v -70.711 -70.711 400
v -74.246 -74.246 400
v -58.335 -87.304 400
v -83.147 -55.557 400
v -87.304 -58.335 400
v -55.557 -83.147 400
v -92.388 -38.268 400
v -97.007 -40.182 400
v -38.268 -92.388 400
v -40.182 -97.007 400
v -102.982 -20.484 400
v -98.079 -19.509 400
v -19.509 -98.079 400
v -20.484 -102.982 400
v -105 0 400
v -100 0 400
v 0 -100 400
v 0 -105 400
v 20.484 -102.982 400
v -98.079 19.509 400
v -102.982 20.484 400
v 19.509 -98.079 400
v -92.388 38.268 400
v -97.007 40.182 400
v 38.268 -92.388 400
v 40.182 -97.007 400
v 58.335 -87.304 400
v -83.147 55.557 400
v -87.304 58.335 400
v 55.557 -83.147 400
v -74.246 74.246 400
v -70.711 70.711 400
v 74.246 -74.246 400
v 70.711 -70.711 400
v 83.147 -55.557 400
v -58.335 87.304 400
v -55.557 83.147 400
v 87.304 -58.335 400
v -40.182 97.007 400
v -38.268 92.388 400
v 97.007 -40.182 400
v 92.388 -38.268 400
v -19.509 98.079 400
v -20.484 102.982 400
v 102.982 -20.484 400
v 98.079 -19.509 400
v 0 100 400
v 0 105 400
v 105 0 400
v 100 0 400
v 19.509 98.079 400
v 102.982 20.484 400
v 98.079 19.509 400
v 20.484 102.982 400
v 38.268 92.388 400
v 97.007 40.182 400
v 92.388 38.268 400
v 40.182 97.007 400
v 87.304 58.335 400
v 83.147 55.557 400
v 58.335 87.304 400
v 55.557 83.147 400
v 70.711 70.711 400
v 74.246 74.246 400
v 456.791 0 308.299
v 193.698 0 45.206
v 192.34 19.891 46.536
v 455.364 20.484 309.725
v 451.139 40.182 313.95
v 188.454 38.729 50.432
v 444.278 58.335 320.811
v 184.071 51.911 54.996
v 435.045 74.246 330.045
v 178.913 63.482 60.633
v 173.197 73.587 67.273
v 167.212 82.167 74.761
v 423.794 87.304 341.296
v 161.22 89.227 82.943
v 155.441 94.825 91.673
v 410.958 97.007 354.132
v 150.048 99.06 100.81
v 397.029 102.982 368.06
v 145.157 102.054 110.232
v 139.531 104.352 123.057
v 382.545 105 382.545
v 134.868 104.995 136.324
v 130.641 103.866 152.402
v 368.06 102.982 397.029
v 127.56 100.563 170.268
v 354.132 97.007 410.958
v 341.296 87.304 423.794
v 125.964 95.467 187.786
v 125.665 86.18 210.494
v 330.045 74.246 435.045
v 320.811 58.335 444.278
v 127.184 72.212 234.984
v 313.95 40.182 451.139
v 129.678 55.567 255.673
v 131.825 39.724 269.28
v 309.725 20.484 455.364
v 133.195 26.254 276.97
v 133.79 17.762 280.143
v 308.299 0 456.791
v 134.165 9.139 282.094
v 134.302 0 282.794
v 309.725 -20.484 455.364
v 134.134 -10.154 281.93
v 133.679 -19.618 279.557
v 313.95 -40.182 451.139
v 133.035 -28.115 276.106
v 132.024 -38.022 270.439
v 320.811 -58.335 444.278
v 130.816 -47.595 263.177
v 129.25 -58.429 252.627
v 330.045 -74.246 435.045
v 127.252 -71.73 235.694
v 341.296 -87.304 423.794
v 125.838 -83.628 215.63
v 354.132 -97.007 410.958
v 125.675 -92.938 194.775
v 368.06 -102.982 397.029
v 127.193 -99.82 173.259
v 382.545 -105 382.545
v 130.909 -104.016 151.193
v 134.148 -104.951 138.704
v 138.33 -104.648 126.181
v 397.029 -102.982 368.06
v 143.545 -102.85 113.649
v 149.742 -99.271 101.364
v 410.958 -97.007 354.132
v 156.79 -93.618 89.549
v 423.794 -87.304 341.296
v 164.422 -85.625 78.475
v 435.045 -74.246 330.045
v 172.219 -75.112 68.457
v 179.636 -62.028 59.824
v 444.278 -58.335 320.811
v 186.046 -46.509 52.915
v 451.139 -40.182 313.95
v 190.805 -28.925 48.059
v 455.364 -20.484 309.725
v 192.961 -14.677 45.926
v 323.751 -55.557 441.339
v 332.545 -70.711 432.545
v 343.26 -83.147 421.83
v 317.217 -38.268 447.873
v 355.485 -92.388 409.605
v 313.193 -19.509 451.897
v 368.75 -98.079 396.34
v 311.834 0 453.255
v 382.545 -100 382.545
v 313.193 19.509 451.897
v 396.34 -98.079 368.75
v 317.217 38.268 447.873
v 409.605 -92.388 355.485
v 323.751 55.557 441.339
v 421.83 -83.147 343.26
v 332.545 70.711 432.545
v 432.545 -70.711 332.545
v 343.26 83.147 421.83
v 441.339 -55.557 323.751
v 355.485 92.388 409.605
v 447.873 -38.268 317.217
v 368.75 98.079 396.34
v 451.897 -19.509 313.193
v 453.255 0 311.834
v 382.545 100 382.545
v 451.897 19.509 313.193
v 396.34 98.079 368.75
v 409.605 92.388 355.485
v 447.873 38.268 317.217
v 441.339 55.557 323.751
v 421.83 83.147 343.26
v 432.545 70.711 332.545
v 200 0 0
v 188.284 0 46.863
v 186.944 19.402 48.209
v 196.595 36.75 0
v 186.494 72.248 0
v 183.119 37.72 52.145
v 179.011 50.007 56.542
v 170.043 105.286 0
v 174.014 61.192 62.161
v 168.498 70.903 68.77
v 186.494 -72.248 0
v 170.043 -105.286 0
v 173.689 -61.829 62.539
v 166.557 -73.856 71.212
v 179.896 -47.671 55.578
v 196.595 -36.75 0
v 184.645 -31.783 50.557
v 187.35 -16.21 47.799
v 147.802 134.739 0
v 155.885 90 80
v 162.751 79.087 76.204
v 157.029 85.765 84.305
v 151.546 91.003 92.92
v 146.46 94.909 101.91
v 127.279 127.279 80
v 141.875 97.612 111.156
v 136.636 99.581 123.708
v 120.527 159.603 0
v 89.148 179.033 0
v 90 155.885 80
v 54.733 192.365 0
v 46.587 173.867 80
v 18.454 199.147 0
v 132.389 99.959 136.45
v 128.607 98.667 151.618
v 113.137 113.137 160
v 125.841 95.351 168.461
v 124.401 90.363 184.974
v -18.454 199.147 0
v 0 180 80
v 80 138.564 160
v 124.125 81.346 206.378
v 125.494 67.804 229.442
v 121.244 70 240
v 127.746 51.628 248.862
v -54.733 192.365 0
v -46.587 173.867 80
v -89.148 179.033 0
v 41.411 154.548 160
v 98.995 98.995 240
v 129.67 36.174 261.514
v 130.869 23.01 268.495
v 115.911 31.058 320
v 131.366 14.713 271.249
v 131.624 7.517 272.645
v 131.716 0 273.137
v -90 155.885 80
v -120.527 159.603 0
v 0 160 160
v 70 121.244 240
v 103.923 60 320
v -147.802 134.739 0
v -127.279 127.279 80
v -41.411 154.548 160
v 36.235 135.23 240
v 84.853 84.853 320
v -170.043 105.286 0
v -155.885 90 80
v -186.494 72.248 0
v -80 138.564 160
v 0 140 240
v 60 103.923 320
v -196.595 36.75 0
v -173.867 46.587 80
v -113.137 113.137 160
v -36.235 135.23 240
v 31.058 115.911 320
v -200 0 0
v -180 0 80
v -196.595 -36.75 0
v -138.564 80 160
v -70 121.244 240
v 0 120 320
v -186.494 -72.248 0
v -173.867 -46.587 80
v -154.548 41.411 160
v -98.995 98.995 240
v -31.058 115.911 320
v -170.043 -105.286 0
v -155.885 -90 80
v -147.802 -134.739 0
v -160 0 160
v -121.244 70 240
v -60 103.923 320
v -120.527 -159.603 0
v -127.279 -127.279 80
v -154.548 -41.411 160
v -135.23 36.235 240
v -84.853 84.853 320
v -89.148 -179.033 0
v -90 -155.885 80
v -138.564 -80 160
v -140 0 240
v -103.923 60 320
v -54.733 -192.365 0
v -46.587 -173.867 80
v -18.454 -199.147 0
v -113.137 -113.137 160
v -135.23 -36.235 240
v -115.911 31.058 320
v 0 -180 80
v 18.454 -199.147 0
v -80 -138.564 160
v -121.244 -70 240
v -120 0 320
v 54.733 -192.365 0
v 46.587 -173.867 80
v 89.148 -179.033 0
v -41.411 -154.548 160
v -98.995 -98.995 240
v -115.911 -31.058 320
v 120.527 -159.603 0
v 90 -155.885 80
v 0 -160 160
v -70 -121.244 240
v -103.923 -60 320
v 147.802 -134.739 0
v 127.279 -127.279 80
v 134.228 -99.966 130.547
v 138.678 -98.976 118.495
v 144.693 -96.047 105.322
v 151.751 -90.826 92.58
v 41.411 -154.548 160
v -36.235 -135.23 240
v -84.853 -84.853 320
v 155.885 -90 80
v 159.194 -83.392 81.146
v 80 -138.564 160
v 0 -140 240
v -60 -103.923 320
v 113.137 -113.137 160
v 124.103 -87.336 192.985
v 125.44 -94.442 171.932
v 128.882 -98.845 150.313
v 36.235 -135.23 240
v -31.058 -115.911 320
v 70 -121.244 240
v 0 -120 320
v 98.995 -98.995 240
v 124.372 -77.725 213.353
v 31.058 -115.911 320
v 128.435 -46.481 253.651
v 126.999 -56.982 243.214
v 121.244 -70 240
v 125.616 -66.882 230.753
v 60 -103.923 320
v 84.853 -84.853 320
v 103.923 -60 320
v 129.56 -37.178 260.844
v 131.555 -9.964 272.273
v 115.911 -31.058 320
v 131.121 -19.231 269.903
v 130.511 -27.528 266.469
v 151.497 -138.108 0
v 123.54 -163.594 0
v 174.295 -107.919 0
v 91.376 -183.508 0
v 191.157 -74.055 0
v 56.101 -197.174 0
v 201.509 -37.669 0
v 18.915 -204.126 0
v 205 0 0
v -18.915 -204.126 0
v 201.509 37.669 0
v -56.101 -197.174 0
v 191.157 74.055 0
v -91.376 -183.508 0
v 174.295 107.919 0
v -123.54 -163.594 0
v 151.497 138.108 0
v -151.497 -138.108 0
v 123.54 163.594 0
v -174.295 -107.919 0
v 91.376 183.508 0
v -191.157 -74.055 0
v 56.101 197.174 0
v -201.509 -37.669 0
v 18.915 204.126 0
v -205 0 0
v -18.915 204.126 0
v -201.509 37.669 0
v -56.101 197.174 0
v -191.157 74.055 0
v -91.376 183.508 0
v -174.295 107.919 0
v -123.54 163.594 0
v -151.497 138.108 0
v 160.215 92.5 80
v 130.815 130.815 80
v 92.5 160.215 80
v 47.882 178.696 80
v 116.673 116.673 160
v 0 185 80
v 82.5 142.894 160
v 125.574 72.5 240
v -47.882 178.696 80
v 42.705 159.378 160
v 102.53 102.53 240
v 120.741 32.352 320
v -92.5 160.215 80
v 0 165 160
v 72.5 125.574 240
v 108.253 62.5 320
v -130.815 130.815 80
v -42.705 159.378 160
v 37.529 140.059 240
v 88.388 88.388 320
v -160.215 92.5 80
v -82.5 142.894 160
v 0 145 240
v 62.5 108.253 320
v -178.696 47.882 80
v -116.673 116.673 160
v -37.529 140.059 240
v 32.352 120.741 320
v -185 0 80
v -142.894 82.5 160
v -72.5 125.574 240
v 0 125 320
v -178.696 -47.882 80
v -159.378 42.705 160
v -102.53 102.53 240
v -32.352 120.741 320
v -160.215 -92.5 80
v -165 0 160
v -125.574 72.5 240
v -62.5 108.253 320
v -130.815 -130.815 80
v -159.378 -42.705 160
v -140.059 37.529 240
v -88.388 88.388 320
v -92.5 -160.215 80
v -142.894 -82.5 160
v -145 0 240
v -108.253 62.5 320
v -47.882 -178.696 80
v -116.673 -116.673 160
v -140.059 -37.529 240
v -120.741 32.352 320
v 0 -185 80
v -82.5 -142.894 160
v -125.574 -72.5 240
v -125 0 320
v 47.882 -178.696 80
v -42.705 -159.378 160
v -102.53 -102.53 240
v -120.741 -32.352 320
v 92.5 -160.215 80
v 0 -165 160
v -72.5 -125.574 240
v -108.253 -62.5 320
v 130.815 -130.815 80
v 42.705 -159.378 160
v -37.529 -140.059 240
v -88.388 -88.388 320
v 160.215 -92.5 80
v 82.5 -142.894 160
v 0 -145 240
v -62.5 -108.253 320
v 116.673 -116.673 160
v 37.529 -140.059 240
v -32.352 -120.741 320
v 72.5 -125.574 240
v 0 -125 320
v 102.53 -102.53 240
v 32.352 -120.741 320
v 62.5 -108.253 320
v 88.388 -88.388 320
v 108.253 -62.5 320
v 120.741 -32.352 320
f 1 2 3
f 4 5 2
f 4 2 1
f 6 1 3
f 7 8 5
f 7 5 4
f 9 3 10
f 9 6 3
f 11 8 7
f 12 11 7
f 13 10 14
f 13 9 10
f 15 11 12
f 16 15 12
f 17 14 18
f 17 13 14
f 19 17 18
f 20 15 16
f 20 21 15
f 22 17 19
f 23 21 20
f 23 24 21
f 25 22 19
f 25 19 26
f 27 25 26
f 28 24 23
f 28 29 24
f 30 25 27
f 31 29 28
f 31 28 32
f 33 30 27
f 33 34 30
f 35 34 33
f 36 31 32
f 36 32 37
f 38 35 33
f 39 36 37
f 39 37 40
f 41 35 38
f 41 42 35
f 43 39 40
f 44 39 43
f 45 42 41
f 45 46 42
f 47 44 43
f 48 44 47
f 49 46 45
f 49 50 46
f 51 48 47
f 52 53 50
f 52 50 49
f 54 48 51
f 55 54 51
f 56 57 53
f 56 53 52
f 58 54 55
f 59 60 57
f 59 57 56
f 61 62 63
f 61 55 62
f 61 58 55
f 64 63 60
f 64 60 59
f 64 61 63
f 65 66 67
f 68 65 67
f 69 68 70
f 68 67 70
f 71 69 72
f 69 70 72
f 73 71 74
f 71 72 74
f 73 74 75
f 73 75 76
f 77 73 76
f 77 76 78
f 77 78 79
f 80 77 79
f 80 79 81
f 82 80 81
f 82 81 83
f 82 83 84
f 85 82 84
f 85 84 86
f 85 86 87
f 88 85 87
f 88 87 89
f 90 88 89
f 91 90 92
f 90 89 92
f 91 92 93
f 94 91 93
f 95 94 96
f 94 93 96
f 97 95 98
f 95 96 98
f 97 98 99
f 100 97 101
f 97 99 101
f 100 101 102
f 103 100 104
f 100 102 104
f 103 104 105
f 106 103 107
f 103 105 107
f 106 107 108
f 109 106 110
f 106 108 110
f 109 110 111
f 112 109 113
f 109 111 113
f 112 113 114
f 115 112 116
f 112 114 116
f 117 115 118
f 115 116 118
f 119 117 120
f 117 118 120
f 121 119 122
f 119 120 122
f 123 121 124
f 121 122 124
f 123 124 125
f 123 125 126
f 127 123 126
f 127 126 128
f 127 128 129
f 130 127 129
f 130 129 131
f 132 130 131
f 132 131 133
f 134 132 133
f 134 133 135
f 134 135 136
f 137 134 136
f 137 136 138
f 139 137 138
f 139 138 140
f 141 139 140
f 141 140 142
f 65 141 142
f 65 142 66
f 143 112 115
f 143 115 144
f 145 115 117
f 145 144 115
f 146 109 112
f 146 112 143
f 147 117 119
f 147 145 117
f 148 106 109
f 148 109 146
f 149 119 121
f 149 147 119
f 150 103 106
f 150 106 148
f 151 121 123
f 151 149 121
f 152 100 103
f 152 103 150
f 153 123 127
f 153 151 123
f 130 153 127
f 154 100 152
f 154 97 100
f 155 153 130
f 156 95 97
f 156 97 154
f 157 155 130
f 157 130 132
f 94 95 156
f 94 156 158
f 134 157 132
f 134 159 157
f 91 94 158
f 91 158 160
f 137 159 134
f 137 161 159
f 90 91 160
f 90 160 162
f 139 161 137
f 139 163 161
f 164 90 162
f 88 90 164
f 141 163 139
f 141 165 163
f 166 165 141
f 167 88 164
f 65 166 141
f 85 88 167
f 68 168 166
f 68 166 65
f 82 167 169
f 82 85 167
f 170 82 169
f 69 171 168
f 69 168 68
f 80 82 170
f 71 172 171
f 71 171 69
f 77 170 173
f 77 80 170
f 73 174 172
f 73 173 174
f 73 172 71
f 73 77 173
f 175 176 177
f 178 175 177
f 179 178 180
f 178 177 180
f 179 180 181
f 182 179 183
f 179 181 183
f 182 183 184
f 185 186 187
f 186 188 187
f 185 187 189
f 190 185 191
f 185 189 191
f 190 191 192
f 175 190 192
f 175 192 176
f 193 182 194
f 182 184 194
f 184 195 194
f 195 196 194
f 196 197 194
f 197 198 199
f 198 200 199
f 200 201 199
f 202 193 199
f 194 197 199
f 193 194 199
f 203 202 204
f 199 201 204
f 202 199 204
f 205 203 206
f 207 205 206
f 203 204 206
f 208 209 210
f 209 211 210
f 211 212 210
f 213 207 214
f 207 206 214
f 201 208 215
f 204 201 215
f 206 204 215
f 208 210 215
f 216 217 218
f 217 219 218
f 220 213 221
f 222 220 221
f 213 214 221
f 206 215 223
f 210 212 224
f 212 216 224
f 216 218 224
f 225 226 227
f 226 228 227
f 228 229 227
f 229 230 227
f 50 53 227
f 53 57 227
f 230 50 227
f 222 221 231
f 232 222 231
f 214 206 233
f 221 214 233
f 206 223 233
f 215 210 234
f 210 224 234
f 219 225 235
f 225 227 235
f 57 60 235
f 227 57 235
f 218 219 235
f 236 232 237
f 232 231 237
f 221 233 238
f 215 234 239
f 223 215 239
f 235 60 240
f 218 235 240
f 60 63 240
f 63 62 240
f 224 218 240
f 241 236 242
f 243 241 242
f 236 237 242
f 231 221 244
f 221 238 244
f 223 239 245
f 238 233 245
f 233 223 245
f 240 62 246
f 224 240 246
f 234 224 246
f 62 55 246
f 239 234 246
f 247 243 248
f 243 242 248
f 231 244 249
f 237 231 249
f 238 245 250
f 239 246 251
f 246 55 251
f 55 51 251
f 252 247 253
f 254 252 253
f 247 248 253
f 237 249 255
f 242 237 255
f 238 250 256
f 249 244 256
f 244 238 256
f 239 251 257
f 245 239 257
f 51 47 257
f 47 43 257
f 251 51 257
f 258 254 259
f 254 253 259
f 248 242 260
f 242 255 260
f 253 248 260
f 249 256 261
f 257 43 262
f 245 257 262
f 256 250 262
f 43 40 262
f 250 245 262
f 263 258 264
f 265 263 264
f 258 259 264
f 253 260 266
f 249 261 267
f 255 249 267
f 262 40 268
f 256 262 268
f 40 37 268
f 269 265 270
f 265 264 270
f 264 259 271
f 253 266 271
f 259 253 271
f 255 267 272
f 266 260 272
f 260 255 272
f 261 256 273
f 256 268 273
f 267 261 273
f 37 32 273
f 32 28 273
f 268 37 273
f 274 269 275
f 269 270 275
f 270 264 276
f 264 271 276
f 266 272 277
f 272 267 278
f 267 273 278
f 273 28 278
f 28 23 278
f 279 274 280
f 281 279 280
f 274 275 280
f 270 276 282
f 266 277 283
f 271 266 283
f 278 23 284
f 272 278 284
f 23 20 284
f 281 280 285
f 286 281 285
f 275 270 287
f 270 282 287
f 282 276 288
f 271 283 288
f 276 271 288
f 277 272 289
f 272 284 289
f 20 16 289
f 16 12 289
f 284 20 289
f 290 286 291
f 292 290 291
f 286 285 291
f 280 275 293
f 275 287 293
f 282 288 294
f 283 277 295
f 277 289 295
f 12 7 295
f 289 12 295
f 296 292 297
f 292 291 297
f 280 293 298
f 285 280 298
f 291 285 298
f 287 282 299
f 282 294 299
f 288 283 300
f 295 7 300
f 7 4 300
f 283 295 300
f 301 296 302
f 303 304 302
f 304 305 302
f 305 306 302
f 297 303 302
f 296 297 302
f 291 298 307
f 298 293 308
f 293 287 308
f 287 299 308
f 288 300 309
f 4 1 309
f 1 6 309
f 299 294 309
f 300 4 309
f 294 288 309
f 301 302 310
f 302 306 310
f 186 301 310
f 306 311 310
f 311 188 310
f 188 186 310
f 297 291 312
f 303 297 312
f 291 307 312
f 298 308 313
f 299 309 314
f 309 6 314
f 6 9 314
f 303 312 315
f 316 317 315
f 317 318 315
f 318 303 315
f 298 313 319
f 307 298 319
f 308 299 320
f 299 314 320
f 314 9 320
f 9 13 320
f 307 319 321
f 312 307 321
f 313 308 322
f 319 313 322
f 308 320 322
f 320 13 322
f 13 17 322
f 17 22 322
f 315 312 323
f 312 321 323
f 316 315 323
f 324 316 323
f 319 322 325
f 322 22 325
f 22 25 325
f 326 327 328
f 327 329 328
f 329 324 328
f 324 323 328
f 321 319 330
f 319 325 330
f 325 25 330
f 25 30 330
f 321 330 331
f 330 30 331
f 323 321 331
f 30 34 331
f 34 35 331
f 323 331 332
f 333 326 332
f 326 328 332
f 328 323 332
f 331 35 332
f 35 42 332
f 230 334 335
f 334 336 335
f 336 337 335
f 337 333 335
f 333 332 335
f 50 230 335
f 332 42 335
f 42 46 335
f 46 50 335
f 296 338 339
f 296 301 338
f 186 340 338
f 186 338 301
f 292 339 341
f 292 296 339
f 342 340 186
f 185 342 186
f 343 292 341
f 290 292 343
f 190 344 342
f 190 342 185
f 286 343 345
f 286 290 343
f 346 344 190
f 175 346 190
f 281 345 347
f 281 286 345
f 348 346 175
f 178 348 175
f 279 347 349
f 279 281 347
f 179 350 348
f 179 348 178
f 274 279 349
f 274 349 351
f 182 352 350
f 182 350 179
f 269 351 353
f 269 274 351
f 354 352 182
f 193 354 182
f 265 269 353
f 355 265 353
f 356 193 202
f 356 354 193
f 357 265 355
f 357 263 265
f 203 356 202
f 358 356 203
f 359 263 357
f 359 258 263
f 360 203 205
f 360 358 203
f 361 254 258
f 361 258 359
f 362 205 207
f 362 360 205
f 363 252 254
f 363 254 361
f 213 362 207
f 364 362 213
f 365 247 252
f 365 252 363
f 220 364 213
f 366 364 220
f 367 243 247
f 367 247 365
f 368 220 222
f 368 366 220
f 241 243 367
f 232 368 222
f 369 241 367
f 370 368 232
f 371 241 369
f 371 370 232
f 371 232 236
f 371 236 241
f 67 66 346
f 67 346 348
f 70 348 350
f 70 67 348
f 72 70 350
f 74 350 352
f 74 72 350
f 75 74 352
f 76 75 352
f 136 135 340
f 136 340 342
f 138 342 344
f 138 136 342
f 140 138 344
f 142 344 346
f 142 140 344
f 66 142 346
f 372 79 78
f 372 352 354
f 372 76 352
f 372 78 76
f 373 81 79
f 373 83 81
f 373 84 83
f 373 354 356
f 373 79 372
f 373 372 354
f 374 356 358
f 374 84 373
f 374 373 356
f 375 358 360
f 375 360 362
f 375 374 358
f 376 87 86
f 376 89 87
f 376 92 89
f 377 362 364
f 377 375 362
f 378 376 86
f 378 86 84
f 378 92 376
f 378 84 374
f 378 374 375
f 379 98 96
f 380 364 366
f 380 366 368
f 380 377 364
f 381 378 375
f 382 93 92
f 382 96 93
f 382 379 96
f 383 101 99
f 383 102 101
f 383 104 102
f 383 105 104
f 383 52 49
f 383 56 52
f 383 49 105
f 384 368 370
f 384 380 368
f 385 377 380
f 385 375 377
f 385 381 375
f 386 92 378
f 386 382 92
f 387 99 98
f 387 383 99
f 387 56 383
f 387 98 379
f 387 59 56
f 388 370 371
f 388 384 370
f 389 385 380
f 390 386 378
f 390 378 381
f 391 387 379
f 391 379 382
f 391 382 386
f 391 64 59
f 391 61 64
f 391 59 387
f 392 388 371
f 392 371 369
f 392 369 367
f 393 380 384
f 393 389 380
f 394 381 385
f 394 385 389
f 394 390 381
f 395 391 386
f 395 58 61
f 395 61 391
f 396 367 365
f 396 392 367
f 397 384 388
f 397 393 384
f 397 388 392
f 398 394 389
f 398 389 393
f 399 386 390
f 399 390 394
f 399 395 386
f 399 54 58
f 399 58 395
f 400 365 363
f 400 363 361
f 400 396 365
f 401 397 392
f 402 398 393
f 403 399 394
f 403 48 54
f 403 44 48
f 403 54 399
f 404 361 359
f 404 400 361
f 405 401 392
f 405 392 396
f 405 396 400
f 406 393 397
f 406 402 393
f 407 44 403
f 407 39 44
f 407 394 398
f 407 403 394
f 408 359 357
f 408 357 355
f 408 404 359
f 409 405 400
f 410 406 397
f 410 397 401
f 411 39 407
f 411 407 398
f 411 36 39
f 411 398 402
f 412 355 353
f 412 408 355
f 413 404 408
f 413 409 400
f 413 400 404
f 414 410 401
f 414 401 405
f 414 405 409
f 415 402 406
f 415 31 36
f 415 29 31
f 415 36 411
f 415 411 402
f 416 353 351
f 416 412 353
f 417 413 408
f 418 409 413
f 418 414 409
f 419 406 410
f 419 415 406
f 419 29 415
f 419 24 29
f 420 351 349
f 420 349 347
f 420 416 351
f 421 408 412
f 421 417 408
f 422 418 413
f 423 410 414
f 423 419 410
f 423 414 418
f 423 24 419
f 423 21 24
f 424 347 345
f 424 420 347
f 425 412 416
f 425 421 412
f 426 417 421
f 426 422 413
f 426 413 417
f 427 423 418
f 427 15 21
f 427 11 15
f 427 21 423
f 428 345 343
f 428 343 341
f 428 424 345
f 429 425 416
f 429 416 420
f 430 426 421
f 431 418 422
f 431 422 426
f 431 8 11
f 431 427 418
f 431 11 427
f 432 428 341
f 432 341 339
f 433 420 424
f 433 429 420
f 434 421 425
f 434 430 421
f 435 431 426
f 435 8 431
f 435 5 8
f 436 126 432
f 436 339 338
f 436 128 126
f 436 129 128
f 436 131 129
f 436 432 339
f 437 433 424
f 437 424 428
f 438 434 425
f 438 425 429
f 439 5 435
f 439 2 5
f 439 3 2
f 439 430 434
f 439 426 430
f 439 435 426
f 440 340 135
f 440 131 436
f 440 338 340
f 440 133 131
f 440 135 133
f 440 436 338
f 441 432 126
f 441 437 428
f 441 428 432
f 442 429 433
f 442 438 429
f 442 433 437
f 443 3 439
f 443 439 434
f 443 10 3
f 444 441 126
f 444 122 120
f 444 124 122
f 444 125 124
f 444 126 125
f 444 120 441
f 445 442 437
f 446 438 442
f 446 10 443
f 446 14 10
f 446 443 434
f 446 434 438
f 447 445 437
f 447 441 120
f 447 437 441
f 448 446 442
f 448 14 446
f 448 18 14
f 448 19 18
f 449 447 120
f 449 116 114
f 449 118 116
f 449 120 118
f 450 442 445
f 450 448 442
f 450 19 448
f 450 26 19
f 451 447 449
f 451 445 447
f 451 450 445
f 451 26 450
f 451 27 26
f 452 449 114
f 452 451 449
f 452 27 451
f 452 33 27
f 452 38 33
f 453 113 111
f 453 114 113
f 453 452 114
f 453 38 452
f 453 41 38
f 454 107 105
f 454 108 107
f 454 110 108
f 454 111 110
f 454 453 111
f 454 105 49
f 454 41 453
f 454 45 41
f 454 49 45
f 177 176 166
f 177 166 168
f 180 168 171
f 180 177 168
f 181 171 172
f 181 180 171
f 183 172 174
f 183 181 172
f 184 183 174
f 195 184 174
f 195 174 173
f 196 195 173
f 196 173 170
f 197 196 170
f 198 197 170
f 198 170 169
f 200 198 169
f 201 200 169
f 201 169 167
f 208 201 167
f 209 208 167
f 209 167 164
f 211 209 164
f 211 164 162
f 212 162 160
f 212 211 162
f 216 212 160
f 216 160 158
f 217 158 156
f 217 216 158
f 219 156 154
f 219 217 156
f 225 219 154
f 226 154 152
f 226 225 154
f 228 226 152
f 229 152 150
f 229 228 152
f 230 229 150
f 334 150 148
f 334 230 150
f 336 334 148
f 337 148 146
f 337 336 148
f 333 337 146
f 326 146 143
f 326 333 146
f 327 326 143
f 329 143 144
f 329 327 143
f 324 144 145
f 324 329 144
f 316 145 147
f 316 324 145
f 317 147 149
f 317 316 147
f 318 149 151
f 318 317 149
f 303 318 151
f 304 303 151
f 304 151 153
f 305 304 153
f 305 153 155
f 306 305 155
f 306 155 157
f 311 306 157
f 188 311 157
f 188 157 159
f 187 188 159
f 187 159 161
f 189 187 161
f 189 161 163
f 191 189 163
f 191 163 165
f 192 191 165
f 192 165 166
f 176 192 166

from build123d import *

# Parameters (mm, degrees)
CYLINDER_R              = 100
CYLINDER_DEPTH          = 400
CYLINDER_PITCH_ANGLE    = 45
CYLINDER001_R           = 105
CYLINDER001_DEPTH       = 400
CYLINDER001_PITCH_ANGLE = 45


with BuildPart() as cylinder:
    # Cylinder → Cylinder (new body)
    with BuildSketch(Plane.XY):
        Circle(CYLINDER_R)
    extrude(amount=CYLINDER_DEPTH)


with BuildPart() as cylinder_1:
    # Cylinder pitch: moved
    add(cylinder.part.rotate(Axis((0, 0, 0), (0, 1, 0)), CYLINDER_PITCH_ANGLE))


with BuildPart() as cylinder_2:
    # Cylinder placement: moved
    add(cylinder_1.part.moved(Location((99.702056, 0, 99.702056))))


with BuildPart() as fusion:
    # Cone → Cone (revolve)
    with BuildSketch(Plane.XZ):
        Polygon((0, 0), (200, 0), (100, 400), (0, 400), align=None)
    revolve(axis=Axis((0, 0, 0), (0, 0, 1)))

    # Fusion: union Cylinder
    add(cylinder_2.part)


with BuildPart() as cylinder001:
    # Cylinder001 → Cylinder001 (new body)
    with BuildSketch(Plane.XY):
        Circle(CYLINDER001_R)
    extrude(amount=CYLINDER001_DEPTH)


with BuildPart() as cylinder001_1:
    # Cylinder001 pitch: moved
    add(cylinder001.part.rotate(Axis((0, 0, 0), (0, 1, 0)), CYLINDER001_PITCH_ANGLE))


with BuildPart() as cylinder001_2:
    # Cylinder001 placement: moved
    add(cylinder001_1.part.moved(Location((99.702056, 0, 99.702056))))


with BuildPart() as cut:
    # Cone001 → Cone001 (revolve)
    with BuildSketch(Plane.XZ):
        Polygon((0, 0), (205, 0), (105, 400), (0, 400), align=None)
    revolve(axis=Axis((0, 0, 0), (0, 0, 1)))

    # Fusion001: union Cylinder001
    add(cylinder001_2.part)

    # Cut: cut Fusion
    add(fusion.part, mode=Mode.SUBTRACT)


solid = cut.part
